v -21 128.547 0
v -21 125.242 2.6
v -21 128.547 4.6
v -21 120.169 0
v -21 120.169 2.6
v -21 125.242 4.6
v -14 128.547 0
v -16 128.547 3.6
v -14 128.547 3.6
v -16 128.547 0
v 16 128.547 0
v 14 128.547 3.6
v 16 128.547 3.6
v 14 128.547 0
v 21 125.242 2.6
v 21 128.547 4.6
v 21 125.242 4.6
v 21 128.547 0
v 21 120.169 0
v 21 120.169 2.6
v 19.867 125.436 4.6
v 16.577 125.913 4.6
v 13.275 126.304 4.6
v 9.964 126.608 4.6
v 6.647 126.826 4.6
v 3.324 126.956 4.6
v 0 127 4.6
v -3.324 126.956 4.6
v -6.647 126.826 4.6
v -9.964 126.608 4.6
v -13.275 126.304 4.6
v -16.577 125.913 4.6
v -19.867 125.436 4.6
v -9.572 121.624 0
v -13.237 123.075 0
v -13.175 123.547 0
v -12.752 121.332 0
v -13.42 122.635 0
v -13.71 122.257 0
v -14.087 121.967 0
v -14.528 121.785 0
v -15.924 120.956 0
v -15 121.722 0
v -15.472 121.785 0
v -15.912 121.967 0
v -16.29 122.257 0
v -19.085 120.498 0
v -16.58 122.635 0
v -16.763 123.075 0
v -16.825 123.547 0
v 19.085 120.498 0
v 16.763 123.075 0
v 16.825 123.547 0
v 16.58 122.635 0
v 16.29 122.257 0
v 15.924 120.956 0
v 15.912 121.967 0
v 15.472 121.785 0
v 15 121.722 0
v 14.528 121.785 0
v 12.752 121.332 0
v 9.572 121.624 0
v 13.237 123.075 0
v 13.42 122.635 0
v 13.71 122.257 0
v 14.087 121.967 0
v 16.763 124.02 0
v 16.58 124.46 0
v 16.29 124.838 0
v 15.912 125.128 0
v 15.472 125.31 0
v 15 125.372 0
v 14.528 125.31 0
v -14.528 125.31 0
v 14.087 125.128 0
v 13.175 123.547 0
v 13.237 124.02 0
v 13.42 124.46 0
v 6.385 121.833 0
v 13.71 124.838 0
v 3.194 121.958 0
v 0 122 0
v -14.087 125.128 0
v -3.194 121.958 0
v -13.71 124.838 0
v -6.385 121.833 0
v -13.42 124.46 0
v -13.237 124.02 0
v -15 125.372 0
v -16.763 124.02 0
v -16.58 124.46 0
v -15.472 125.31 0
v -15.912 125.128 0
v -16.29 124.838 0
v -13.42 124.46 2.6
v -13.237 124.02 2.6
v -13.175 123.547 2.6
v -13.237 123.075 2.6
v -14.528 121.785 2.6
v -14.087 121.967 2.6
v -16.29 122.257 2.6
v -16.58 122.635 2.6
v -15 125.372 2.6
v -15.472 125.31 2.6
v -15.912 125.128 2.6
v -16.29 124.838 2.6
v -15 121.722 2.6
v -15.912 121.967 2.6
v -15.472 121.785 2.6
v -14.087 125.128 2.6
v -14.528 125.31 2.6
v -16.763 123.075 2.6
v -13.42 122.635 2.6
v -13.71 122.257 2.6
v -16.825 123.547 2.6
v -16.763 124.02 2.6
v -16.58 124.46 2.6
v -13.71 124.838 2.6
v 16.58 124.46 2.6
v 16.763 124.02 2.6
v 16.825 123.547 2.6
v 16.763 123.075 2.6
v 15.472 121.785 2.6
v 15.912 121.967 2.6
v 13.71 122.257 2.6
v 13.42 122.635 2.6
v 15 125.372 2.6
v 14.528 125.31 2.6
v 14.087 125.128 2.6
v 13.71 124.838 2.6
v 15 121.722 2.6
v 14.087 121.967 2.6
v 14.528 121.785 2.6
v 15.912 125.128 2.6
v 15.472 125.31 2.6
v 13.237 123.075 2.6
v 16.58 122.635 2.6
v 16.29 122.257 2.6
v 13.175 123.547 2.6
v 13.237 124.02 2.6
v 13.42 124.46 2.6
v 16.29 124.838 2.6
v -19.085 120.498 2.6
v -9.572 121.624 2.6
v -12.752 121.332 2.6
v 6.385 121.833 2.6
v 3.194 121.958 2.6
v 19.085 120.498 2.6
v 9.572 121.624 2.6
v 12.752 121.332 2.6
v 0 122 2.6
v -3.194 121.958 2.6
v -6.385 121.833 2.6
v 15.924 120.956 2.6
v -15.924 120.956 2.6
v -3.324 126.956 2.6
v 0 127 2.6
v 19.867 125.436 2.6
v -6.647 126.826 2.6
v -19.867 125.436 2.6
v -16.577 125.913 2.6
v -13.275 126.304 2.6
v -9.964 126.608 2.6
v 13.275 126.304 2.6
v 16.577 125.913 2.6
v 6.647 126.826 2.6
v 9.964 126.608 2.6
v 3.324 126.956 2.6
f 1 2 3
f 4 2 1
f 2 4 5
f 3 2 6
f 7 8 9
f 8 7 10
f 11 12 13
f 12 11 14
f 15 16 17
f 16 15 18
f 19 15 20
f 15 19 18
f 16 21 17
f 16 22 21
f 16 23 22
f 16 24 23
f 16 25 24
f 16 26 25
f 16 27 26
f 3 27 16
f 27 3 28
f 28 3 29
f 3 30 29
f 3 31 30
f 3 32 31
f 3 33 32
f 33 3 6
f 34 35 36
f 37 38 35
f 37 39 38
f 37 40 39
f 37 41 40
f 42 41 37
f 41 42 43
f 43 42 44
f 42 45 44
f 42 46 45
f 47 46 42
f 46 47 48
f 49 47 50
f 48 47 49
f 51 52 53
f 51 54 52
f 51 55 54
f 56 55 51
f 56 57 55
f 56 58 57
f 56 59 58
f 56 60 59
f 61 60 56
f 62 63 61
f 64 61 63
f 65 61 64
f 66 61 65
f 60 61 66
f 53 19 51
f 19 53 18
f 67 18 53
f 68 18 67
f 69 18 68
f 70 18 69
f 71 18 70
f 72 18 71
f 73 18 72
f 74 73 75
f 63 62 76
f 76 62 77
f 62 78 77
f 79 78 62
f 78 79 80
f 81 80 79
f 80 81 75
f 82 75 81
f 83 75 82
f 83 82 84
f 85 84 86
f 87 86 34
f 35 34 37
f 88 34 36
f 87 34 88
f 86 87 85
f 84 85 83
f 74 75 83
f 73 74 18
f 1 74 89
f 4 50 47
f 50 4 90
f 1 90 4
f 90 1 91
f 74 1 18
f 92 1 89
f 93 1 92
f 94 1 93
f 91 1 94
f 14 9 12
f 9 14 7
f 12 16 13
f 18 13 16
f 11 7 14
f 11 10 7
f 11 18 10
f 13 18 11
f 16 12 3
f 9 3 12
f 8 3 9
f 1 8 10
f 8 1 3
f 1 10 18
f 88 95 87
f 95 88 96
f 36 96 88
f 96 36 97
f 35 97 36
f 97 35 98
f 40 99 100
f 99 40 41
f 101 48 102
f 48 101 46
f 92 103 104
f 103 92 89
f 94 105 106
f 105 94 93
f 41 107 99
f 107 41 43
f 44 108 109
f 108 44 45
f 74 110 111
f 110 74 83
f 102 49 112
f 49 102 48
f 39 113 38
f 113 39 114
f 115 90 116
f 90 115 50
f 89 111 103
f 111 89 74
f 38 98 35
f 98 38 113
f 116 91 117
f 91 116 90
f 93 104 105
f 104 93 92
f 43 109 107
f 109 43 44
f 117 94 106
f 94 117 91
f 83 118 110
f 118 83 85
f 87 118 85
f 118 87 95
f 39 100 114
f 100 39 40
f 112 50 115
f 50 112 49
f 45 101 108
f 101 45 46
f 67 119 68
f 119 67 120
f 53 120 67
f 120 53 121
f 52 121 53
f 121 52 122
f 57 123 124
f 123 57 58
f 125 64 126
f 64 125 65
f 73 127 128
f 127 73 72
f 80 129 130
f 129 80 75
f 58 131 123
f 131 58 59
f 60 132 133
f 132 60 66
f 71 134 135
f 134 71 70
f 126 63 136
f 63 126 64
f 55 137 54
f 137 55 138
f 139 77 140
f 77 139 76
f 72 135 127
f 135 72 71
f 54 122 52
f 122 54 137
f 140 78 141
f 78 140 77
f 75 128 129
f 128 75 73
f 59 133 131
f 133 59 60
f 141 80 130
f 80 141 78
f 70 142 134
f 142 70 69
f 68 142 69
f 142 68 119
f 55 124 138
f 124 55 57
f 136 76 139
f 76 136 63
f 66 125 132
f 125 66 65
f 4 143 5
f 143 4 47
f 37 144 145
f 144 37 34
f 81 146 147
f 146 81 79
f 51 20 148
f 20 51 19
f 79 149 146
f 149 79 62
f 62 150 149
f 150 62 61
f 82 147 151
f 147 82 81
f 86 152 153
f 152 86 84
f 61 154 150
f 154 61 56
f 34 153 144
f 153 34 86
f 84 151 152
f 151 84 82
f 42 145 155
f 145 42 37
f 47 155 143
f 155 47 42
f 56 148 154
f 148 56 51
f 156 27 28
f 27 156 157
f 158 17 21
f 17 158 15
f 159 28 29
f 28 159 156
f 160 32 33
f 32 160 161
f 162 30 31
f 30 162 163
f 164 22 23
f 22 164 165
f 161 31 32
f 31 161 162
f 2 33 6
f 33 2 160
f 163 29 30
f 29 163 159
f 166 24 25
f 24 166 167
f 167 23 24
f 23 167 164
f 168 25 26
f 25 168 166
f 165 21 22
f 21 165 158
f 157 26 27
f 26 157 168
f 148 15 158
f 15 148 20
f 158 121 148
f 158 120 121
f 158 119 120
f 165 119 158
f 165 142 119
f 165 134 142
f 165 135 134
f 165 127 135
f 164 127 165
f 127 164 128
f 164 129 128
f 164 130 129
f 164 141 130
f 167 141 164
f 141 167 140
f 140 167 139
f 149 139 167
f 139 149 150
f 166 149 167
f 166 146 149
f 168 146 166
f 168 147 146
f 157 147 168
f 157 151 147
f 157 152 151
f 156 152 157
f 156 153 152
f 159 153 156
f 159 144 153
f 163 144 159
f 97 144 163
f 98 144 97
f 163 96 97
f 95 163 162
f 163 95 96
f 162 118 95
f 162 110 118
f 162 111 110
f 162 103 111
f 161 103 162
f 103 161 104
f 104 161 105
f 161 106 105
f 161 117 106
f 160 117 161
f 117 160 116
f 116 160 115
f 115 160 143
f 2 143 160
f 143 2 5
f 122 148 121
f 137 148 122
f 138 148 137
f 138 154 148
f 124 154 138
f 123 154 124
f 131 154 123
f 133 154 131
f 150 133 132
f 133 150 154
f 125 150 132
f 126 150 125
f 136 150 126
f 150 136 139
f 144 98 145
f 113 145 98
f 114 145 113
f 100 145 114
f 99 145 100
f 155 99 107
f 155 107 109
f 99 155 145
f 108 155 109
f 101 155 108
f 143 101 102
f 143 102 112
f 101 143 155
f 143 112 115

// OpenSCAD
// file: configuration.scad
// Increase this if your slicer or printer make holes too tight.
extra_radius = 0.2;

// OD = outside diameter, corner to corner.
m3_nut_od = 6.1;
m3_nut_radius = m3_nut_od/2 + 0.2 + extra_radius;

// Major diameter of metric 3mm thread.
m3_major = 2.85;
m3_radius = m3_major/2 + extra_radius;
m3_wide_radius = m3_major/2 + 0.2 + extra_radius;

// NEMA17 stepper motors.
motor_shaft_diameter = 5;
motor_shaft_radius = motor_shaft_diameter/2 + extra_radius;

// Frame brackets.
thickness = 3.6;
// main file
include <configuration.scad>;

triangle_openbeam = 360; // mm length

// Intersection points between inside edges of triangle OpenBeam.
triangle_inside = triangle_openbeam + 42;

// Distance from center to inside edge of OpenBeam.
triangle_offset = triangle_inside/2 * tan(30) + 7.5;

// Borosilicate glass.
glass_diameter = 254;
glass_radius = glass_diameter/2;
glass_thickness = 19.05;
translate([0, 0, thickness-1]) %
  cylinder(r=glass_radius, h=glass_thickness, $fn=240);

// OpenBeam triangle.
for (a = [0:120:359]) {
  rotate([0, 0, a]) {
    translate([0, triangle_offset, -7.5]) %
      cube([triangle_openbeam, 15, 15], center=true);
  }
}

module frame_glass() {
  difference() {
    union() {
      translate([0, triangle_offset-20, thickness/2]) minkowski() {
        difference() {
          cube([32, 40, thickness-1], center=true);
          cube([28, 50, 20], center=true);
        }
        cylinder(r=5, h=1, center=true);
      }
      intersection() {
        translate([0, triangle_offset-20, (thickness+1)/2])
          cube([42, 50, thickness+1], center=true);
        cylinder(r=glass_radius+5, h=20, center=true, $fn=240	);
      }
    }
    cylinder(r=glass_radius-5, h=20, center=true, $fn=240);
    translate([0, 0, thickness-1])
      cylinder(r=glass_radius, h=glass_thickness, $fn=240);
    for (x = [-15, 15]) {
      translate([x, triangle_offset, 0]) #
        cylinder(r=m3_wide_radius, h=20, center=true, $fn=24);
    }
  }
}

frame_glass();
